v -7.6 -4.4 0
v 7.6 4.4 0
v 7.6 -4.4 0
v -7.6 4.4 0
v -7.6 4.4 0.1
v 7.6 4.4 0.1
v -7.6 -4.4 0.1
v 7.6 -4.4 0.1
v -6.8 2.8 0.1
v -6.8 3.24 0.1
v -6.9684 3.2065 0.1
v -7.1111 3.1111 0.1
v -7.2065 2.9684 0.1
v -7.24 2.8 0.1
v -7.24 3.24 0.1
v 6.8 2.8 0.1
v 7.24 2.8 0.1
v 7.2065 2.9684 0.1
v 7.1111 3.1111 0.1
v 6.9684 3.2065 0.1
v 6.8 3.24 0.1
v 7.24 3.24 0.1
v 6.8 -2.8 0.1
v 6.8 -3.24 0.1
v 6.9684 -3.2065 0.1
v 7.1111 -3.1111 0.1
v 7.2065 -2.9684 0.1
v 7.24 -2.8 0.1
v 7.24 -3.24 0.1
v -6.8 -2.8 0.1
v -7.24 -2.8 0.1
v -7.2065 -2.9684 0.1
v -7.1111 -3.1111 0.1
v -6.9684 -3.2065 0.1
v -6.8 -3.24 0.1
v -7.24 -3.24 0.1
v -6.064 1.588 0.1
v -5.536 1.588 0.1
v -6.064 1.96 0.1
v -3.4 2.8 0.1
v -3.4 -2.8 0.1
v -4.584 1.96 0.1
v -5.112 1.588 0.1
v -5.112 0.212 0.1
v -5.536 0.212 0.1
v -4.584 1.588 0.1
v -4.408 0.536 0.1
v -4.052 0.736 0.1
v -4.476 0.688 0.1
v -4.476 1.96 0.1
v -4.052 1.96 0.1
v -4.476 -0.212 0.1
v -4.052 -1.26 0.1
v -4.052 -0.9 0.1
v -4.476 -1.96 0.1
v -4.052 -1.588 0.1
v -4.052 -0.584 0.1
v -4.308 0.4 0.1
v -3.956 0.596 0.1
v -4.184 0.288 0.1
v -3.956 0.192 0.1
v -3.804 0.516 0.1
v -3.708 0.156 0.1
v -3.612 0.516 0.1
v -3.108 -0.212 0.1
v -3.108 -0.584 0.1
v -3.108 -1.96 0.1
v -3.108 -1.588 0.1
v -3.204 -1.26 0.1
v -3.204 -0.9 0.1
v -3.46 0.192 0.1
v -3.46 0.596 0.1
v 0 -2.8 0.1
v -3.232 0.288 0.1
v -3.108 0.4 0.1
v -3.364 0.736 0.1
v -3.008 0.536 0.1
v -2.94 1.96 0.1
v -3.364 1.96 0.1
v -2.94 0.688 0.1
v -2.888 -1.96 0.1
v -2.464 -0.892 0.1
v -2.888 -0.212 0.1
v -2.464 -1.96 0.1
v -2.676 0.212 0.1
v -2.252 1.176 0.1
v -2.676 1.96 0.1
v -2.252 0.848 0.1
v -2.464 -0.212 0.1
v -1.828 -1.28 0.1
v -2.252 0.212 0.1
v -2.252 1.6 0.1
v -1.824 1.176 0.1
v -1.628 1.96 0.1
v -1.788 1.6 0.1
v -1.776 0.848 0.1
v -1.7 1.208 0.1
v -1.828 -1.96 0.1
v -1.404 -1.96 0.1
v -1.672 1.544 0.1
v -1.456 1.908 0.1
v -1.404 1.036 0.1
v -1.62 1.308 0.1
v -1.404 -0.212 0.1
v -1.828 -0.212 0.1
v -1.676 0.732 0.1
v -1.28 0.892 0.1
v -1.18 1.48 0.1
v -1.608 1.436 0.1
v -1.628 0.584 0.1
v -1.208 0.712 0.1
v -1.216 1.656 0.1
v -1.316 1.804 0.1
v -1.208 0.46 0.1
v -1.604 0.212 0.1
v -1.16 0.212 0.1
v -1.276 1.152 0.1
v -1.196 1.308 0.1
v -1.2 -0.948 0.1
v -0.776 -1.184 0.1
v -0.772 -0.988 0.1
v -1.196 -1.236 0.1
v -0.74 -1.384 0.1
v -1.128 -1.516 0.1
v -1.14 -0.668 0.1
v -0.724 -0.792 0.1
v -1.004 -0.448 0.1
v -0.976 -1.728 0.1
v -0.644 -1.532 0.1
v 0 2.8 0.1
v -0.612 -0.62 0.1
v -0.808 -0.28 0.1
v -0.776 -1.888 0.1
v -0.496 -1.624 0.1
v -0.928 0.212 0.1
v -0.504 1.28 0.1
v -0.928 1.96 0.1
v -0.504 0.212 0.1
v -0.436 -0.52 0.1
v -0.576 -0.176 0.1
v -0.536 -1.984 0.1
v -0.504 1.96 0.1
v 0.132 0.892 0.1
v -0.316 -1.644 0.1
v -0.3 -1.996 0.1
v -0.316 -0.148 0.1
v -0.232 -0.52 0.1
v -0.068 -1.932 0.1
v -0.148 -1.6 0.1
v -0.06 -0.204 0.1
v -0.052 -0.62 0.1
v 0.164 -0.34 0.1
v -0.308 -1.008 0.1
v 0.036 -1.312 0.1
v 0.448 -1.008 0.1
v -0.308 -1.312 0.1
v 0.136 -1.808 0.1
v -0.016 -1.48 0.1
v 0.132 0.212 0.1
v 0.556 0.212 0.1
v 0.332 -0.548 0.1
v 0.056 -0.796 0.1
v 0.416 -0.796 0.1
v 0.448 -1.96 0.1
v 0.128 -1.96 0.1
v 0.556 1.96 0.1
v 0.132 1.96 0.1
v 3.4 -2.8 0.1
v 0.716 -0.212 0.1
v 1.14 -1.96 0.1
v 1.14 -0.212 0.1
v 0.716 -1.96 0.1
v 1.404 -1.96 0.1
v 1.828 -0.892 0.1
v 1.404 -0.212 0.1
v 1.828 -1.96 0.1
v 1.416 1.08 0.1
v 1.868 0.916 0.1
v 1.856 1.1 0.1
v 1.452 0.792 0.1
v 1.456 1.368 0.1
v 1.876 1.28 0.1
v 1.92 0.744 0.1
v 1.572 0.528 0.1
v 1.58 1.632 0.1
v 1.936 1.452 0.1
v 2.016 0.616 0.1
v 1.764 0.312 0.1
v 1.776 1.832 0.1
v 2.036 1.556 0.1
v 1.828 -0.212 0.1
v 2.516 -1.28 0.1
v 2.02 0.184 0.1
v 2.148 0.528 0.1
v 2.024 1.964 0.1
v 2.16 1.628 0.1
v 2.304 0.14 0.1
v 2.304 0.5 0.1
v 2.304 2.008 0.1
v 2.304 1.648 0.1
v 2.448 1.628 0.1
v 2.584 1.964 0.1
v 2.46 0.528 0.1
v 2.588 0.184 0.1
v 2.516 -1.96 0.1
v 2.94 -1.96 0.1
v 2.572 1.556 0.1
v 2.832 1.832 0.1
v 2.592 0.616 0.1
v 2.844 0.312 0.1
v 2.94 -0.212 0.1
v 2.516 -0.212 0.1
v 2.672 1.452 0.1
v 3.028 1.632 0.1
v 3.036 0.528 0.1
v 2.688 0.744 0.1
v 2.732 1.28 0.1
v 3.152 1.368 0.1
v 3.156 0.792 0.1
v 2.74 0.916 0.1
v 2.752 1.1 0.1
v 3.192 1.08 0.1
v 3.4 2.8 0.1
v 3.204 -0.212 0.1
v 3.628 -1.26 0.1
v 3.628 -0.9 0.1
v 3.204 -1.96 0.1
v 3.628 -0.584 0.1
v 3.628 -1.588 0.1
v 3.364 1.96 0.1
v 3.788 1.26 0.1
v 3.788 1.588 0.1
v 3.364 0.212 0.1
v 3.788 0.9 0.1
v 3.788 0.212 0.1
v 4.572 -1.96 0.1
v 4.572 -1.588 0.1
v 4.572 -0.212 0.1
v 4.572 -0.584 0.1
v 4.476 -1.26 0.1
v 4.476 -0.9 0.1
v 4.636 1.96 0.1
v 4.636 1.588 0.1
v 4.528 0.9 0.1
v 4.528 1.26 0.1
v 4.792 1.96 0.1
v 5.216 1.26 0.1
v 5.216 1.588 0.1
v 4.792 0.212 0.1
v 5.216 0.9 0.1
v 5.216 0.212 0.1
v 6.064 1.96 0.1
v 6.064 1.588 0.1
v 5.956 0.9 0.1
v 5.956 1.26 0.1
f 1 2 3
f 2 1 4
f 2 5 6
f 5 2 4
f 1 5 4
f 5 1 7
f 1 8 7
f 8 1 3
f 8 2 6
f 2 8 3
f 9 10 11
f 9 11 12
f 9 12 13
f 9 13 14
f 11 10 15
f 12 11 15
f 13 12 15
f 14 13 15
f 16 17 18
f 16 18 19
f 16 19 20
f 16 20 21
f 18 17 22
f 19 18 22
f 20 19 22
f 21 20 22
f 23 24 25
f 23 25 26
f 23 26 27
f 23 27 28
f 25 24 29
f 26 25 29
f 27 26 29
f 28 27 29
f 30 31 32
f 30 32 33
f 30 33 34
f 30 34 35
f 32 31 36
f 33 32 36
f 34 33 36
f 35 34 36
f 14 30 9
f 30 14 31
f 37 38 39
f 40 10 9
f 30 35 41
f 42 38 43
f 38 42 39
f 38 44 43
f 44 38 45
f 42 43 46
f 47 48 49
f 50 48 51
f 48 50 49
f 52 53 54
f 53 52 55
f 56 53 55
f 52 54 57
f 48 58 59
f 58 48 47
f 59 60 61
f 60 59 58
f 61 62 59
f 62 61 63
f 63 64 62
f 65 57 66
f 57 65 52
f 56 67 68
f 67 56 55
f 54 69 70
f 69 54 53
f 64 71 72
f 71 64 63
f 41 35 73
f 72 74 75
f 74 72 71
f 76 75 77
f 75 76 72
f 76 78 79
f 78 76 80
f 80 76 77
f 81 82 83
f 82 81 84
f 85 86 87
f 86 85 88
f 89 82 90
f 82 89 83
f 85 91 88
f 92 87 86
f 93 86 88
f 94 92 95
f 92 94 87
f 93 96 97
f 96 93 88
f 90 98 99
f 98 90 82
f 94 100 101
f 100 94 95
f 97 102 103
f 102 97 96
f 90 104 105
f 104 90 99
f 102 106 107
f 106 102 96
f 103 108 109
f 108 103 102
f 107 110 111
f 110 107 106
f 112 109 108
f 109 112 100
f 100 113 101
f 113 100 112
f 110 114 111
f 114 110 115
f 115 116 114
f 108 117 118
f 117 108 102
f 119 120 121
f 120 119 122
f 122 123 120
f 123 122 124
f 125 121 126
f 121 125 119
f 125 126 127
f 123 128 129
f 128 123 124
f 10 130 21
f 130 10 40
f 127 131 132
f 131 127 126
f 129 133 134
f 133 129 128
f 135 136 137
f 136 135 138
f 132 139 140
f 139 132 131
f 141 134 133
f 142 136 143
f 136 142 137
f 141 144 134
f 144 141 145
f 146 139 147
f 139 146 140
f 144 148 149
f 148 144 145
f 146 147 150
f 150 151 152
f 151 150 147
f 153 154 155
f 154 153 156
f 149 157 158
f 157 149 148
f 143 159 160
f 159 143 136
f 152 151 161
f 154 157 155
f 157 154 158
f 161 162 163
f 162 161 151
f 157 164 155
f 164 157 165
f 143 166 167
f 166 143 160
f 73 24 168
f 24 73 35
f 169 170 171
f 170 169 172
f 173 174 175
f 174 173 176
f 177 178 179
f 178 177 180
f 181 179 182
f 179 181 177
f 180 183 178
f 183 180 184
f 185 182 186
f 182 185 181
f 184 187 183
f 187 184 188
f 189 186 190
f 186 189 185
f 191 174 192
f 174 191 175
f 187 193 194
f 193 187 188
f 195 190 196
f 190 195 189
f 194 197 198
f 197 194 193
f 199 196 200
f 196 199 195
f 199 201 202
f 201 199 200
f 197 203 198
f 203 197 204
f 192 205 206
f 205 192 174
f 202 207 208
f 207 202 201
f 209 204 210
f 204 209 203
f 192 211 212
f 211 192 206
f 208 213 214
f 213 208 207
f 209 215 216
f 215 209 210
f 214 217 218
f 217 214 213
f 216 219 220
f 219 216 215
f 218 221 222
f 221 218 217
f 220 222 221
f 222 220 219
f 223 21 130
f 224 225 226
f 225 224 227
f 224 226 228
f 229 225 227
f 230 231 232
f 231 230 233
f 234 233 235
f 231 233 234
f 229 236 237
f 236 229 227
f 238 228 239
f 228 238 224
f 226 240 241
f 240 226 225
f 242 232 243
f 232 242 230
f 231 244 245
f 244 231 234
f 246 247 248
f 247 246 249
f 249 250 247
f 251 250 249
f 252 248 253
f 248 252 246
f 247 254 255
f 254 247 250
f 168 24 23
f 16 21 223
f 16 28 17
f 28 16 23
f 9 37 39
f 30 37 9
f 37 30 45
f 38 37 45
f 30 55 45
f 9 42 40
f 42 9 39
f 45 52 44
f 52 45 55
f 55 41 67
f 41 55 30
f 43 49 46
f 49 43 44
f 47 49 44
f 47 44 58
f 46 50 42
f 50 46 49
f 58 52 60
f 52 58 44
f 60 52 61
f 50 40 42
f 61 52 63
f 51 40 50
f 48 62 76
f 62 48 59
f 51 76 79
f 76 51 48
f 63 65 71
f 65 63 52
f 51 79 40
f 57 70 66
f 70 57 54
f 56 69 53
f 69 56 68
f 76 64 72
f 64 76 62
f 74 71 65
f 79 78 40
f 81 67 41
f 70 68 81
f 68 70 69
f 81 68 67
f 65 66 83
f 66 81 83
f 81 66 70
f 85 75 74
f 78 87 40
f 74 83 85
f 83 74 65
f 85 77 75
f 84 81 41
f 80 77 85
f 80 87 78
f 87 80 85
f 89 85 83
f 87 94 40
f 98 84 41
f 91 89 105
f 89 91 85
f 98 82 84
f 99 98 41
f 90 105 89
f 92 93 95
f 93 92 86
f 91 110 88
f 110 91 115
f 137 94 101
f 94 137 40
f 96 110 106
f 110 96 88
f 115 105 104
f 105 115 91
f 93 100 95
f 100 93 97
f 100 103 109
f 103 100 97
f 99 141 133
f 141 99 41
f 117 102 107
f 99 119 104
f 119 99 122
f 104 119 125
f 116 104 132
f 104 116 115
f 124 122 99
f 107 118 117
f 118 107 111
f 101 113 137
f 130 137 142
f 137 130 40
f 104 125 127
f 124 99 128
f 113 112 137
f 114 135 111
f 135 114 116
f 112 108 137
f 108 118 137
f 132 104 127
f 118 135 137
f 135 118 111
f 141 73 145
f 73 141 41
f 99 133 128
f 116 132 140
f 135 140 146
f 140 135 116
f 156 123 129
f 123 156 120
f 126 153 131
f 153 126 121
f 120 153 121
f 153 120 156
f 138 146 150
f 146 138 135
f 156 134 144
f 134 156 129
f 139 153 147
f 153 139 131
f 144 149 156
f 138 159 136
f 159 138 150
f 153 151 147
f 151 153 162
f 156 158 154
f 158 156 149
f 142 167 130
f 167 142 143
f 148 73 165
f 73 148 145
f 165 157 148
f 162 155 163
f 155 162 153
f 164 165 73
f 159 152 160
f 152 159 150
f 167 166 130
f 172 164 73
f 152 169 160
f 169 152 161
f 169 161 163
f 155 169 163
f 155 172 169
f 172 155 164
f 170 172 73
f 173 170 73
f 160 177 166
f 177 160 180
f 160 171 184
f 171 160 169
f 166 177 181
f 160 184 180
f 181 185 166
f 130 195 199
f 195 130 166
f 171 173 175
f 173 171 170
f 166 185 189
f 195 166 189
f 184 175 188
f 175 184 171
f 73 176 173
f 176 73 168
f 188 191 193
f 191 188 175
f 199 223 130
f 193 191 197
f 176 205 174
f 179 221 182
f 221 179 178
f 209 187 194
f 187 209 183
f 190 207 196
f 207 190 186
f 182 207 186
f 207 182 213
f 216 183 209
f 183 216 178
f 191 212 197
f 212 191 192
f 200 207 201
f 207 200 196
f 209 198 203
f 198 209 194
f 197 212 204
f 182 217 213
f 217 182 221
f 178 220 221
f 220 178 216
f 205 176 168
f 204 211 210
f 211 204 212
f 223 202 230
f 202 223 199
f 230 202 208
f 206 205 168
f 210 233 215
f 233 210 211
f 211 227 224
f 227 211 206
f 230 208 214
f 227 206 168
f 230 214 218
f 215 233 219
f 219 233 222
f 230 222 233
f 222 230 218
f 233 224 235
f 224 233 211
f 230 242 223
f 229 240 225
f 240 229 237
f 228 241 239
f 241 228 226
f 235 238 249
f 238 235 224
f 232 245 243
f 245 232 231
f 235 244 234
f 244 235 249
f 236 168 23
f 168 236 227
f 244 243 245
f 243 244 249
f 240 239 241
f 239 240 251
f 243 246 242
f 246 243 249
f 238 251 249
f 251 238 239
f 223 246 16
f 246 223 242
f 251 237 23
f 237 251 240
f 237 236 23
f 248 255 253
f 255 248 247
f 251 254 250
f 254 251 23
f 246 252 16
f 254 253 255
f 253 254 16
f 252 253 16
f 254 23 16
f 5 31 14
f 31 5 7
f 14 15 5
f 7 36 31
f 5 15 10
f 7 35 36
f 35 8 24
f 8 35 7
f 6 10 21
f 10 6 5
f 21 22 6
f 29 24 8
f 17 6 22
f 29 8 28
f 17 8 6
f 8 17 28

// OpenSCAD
// file: ../p/1-4ndis.scad
use <../lib.scad>
function ldraw_lib__1_4ndis() = [
// 0 Disc Negative 0.25
// 0 Name: 1-4ndis.dat
// 0 Author: James Jessiman
// 0 !LDRAW_ORG Primitive UPDATE 2012-01
// 0 !LICENSE Licensed under CC BY 4.0 : see CAreadme.txt
// 
// 0 BFC CERTIFY CCW
  [0,"BFC","CERTIFY"],
  [0,"BFC","CCW"],
// 
// 0 !HISTORY 2002-03-23 [sbliss] Added BFC Statement
// 0 !HISTORY 2002-04-25 [PTadmin] Official Update 2002-02
// 0 !HISTORY 2007-06-22 [PTadmin] Header formatted for Contributor Agreement
// 0 !HISTORY 2008-07-01 [PTadmin] Official Update 2008-01
// 0 !HISTORY 2012-02-16 [Philo] Changed to CCW
// 0 !HISTORY 2012-03-30 [PTadmin] Official Update 2012-01
// 
// 
// 3 16 0.9239 0 0.3827 1 0 0 1 0 1
  [3,16,0.9239,0,0.3827,1,0,0,1,0,1],
// 3 16 0.7071 0 0.7071 0.9239 0 0.3827 1 0 1
  [3,16,0.7071,0,0.7071,0.9239,0,0.3827,1,0,1],
// 3 16 0.3827 0 0.9239 0.7071 0 0.7071 1 0 1
  [3,16,0.3827,0,0.9239,0.7071,0,0.7071,1,0,1],
// 3 16 0 0 1 0.3827 0 0.9239 1 0 1
  [3,16,0,0,1,0.3827,0,0.9239,1,0,1],
];
module ldraw_lib__1_4ndis(step=0, col=false, unit=2/5, alt=false, line=0.2, solid=!$preview)
    makepoly(ldraw_lib__1_4ndis(), step=step, col=col, unit=unit, alt=alt, line=line, solid=solid);
ldraw_lib__1_4ndis(line=0.2);
// file: ../p/1-4disc.scad
use <../lib.scad>
function ldraw_lib__1_4disc() = [
// 0 Disc 0.25
// 0 Name: 1-4disc.dat
// 0 Author: James Jessiman
// 0 !LDRAW_ORG Primitive UPDATE 2002-02
// 0 !LICENSE Licensed under CC BY 4.0 : see CAreadme.txt
// 
// 0 BFC CERTIFY CCW
  [0,"BFC","CERTIFY"],
  [0,"BFC","CCW"],
// 
// 0 !HISTORY 2002-03-23 [sbliss] Added BFC statement.
// 0 !HISTORY 2002-04-25 [PTadmin] Official Update 2002-02
// 0 !HISTORY 2007-06-22 [PTadmin] Header formatted for Contributor Agreement
// 0 !HISTORY 2008-07-01 [PTadmin] Official Update 2008-01
// 
// 
// 3 16 0 0 0 1 0 0 0.9239 0 0.3827
  [3,16,0,0,0,1,0,0,0.9239,0,0.3827],
// 3 16 0 0 0 0.9239 0 0.3827 0.7071 0 0.7071
  [3,16,0,0,0,0.9239,0,0.3827,0.7071,0,0.7071],
// 3 16 0 0 0 0.7071 0 0.7071 0.3827 0 0.9239
  [3,16,0,0,0,0.7071,0,0.7071,0.3827,0,0.9239],
// 3 16 0 0 0 0.3827 0 0.9239 0 0 1
  [3,16,0,0,0,0.3827,0,0.9239,0,0,1],
// 0
];
module ldraw_lib__1_4disc(step=0, col=false, unit=2/5, alt=false, line=0.2, solid=!$preview)
    makepoly(ldraw_lib__1_4disc(), step=step, col=col, unit=unit, alt=alt, line=line, solid=solid);
ldraw_lib__1_4disc(line=0.2);
// file: ../p/box5-12.scad
use <../lib.scad>
function ldraw_lib__box5_12() = [
// 0 Box with 5 Faces without Any Edges
// 0 Name: box5-12.dat
// 0 Author: Chris Dee [cwdee]
// 0 !LDRAW_ORG Primitive UPDATE 2009-02
// 0 !LICENSE Licensed under CC BY 4.0 : see CAreadme.txt
// 
// 0 BFC CERTIFY CCW
  [0,"BFC","CERTIFY"],
  [0,"BFC","CCW"],
// 
// 0 !HISTORY 2009-09-03 [PTadmin] Official Update 2009-02
// 
// 
// 4 16 1 1 1 1 1 -1 -1 1 -1 -1 1 1
  [4,16,1,1,1,1,1,-1,-1,1,-1,-1,1,1],
// 4 16 -1 0 1 1 0 1 1 1 1 -1 1 1
  [4,16,-1,0,1,1,0,1,1,1,1,-1,1,1],
// 4 16 -1 0 -1 -1 0 1 -1 1 1 -1 1 -1
  [4,16,-1,0,-1,-1,0,1,-1,1,1,-1,1,-1],
// 4 16 1 0 -1 -1 0 -1 -1 1 -1 1 1 -1
  [4,16,1,0,-1,-1,0,-1,-1,1,-1,1,1,-1],
// 4 16 1 0 1 1 0 -1 1 1 -1 1 1 1
  [4,16,1,0,1,1,0,-1,1,1,-1,1,1,1],
// 0
];
module ldraw_lib__box5_12(step=0, col=false, unit=2/5, alt=false, line=0.2, solid=!$preview)
    makepoly(ldraw_lib__box5_12(), step=step, col=col, unit=unit, alt=alt, line=line, solid=solid);
ldraw_lib__box5_12(line=0.2);
// main file
use <../lib.scad>
use <../p/box5-12.scad>
use <s/197915as01.scad>
function ldraw_lib__192375g() = [
// 0 Sticker  1.1 x  1.9 with Black "TURN OFF ENGINE" and Border
// 0 Name: 192375g.dat
// 0 Author: Takeshi Takahashi [RainbowDolphin]
// 0 !LDRAW_ORG Part UPDATE 2023-02
// 0 !LICENSE Licensed under CC BY 4.0 : see CAreadme.txt
// 
// 0 BFC CERTIFY CCW
  [0,"BFC","CERTIFY"],
  [0,"BFC","CCW"],
// 
// 0 !KEYWORDS Exxon, Gas Station, Set 6375-2
// 
// 0 !HISTORY 2021-06-05 [RainbowDolphin] Created based on 197915a by N. W. Perry [Plastikean]
// 0 !HISTORY 2023-04-17 [OrionP] Official Update 2023-02
// 
// 
// 1 16 0 -.25 0 19 0 0 0 .25 0 0 0 11 box5-12.dat
  [1,16,0,-.25,0,19,0,0,0,.25,0,0,0,11, ldraw_lib__box5_12()],
// 1 15 0 -.25 0 1 0 0 0 1 0 0 0 1 s\197915as01.dat
  [1,15,0,-.25,0,1,0,0,0,1,0,0,0,1, ldraw_lib__s__197915as01()],
// 
// 4 15 -19 -.25 -11 -18.1 -.25 -7 -18.1 -.25 7 -19 -.25 11
  [4,15,-19,-.25,-11,-18.1,-.25,-7,-18.1,-.25,7,-19,-.25,11],
// 3 15 -18.1 -.25 7 -18.1 -.25 8.1 -19 -.25 11
  [3,15,-18.1,-.25,7,-18.1,-.25,8.1,-19,-.25,11],
// 3 15 -19 -.25 -11 -18.1 -.25 -8.1 -18.1 -.25 -7
  [3,15,-19,-.25,-11,-18.1,-.25,-8.1,-18.1,-.25,-7],
// 3 15 -19 -.25 11 -18.1 -.25 8.1 -17 -.25 8.1
  [3,15,-19,-.25,11,-18.1,-.25,8.1,-17,-.25,8.1],
// 3 15 -19 -.25 -11 -17 -.25 -8.1 -18.1 -.25 -8.1
  [3,15,-19,-.25,-11,-17,-.25,-8.1,-18.1,-.25,-8.1],
// 4 15 -19 -.25 -11 19 -.25 -11 17 -.25 -8.1 -17 -.25 -8.1
  [4,15,-19,-.25,-11,19,-.25,-11,17,-.25,-8.1,-17,-.25,-8.1],
// 4 15 -19 -.25 11 -17 -.25 8.1 17 -.25 8.1 19 -.25 11
  [4,15,-19,-.25,11,-17,-.25,8.1,17,-.25,8.1,19,-.25,11],
// 3 15 17 -.25 8.1 18.1 -.25 8.1 19 -.25 11
  [3,15,17,-.25,8.1,18.1,-.25,8.1,19,-.25,11],
// 3 15 18.1 -.25 -8.1 17 -.25 -8.1 19 -.25 -11
  [3,15,18.1,-.25,-8.1,17,-.25,-8.1,19,-.25,-11],
// 3 15 18.1 -.25 7 19 -.25 11 18.1 -.25 8.1
  [3,15,18.1,-.25,7,19,-.25,11,18.1,-.25,8.1],
// 3 15 18.1 -.25 -8.1 19 -.25 -11 18.1 -.25 -7
  [3,15,18.1,-.25,-8.1,19,-.25,-11,18.1,-.25,-7],
// 4 15 19 -.25 -11 19 -.25 11 18.1 -.25 7 18.1 -.25 -7
  [4,15,19,-.25,-11,19,-.25,11,18.1,-.25,7,18.1,-.25,-7],
];
module ldraw_lib__192375g(step=0, col=false, unit=2/5, alt=false, line=0.2, solid=!$preview)
    makepoly(ldraw_lib__192375g(), step=step, col=col, unit=unit, alt=alt, line=line, solid=solid);
ldraw_lib__192375g(line=0.2);
